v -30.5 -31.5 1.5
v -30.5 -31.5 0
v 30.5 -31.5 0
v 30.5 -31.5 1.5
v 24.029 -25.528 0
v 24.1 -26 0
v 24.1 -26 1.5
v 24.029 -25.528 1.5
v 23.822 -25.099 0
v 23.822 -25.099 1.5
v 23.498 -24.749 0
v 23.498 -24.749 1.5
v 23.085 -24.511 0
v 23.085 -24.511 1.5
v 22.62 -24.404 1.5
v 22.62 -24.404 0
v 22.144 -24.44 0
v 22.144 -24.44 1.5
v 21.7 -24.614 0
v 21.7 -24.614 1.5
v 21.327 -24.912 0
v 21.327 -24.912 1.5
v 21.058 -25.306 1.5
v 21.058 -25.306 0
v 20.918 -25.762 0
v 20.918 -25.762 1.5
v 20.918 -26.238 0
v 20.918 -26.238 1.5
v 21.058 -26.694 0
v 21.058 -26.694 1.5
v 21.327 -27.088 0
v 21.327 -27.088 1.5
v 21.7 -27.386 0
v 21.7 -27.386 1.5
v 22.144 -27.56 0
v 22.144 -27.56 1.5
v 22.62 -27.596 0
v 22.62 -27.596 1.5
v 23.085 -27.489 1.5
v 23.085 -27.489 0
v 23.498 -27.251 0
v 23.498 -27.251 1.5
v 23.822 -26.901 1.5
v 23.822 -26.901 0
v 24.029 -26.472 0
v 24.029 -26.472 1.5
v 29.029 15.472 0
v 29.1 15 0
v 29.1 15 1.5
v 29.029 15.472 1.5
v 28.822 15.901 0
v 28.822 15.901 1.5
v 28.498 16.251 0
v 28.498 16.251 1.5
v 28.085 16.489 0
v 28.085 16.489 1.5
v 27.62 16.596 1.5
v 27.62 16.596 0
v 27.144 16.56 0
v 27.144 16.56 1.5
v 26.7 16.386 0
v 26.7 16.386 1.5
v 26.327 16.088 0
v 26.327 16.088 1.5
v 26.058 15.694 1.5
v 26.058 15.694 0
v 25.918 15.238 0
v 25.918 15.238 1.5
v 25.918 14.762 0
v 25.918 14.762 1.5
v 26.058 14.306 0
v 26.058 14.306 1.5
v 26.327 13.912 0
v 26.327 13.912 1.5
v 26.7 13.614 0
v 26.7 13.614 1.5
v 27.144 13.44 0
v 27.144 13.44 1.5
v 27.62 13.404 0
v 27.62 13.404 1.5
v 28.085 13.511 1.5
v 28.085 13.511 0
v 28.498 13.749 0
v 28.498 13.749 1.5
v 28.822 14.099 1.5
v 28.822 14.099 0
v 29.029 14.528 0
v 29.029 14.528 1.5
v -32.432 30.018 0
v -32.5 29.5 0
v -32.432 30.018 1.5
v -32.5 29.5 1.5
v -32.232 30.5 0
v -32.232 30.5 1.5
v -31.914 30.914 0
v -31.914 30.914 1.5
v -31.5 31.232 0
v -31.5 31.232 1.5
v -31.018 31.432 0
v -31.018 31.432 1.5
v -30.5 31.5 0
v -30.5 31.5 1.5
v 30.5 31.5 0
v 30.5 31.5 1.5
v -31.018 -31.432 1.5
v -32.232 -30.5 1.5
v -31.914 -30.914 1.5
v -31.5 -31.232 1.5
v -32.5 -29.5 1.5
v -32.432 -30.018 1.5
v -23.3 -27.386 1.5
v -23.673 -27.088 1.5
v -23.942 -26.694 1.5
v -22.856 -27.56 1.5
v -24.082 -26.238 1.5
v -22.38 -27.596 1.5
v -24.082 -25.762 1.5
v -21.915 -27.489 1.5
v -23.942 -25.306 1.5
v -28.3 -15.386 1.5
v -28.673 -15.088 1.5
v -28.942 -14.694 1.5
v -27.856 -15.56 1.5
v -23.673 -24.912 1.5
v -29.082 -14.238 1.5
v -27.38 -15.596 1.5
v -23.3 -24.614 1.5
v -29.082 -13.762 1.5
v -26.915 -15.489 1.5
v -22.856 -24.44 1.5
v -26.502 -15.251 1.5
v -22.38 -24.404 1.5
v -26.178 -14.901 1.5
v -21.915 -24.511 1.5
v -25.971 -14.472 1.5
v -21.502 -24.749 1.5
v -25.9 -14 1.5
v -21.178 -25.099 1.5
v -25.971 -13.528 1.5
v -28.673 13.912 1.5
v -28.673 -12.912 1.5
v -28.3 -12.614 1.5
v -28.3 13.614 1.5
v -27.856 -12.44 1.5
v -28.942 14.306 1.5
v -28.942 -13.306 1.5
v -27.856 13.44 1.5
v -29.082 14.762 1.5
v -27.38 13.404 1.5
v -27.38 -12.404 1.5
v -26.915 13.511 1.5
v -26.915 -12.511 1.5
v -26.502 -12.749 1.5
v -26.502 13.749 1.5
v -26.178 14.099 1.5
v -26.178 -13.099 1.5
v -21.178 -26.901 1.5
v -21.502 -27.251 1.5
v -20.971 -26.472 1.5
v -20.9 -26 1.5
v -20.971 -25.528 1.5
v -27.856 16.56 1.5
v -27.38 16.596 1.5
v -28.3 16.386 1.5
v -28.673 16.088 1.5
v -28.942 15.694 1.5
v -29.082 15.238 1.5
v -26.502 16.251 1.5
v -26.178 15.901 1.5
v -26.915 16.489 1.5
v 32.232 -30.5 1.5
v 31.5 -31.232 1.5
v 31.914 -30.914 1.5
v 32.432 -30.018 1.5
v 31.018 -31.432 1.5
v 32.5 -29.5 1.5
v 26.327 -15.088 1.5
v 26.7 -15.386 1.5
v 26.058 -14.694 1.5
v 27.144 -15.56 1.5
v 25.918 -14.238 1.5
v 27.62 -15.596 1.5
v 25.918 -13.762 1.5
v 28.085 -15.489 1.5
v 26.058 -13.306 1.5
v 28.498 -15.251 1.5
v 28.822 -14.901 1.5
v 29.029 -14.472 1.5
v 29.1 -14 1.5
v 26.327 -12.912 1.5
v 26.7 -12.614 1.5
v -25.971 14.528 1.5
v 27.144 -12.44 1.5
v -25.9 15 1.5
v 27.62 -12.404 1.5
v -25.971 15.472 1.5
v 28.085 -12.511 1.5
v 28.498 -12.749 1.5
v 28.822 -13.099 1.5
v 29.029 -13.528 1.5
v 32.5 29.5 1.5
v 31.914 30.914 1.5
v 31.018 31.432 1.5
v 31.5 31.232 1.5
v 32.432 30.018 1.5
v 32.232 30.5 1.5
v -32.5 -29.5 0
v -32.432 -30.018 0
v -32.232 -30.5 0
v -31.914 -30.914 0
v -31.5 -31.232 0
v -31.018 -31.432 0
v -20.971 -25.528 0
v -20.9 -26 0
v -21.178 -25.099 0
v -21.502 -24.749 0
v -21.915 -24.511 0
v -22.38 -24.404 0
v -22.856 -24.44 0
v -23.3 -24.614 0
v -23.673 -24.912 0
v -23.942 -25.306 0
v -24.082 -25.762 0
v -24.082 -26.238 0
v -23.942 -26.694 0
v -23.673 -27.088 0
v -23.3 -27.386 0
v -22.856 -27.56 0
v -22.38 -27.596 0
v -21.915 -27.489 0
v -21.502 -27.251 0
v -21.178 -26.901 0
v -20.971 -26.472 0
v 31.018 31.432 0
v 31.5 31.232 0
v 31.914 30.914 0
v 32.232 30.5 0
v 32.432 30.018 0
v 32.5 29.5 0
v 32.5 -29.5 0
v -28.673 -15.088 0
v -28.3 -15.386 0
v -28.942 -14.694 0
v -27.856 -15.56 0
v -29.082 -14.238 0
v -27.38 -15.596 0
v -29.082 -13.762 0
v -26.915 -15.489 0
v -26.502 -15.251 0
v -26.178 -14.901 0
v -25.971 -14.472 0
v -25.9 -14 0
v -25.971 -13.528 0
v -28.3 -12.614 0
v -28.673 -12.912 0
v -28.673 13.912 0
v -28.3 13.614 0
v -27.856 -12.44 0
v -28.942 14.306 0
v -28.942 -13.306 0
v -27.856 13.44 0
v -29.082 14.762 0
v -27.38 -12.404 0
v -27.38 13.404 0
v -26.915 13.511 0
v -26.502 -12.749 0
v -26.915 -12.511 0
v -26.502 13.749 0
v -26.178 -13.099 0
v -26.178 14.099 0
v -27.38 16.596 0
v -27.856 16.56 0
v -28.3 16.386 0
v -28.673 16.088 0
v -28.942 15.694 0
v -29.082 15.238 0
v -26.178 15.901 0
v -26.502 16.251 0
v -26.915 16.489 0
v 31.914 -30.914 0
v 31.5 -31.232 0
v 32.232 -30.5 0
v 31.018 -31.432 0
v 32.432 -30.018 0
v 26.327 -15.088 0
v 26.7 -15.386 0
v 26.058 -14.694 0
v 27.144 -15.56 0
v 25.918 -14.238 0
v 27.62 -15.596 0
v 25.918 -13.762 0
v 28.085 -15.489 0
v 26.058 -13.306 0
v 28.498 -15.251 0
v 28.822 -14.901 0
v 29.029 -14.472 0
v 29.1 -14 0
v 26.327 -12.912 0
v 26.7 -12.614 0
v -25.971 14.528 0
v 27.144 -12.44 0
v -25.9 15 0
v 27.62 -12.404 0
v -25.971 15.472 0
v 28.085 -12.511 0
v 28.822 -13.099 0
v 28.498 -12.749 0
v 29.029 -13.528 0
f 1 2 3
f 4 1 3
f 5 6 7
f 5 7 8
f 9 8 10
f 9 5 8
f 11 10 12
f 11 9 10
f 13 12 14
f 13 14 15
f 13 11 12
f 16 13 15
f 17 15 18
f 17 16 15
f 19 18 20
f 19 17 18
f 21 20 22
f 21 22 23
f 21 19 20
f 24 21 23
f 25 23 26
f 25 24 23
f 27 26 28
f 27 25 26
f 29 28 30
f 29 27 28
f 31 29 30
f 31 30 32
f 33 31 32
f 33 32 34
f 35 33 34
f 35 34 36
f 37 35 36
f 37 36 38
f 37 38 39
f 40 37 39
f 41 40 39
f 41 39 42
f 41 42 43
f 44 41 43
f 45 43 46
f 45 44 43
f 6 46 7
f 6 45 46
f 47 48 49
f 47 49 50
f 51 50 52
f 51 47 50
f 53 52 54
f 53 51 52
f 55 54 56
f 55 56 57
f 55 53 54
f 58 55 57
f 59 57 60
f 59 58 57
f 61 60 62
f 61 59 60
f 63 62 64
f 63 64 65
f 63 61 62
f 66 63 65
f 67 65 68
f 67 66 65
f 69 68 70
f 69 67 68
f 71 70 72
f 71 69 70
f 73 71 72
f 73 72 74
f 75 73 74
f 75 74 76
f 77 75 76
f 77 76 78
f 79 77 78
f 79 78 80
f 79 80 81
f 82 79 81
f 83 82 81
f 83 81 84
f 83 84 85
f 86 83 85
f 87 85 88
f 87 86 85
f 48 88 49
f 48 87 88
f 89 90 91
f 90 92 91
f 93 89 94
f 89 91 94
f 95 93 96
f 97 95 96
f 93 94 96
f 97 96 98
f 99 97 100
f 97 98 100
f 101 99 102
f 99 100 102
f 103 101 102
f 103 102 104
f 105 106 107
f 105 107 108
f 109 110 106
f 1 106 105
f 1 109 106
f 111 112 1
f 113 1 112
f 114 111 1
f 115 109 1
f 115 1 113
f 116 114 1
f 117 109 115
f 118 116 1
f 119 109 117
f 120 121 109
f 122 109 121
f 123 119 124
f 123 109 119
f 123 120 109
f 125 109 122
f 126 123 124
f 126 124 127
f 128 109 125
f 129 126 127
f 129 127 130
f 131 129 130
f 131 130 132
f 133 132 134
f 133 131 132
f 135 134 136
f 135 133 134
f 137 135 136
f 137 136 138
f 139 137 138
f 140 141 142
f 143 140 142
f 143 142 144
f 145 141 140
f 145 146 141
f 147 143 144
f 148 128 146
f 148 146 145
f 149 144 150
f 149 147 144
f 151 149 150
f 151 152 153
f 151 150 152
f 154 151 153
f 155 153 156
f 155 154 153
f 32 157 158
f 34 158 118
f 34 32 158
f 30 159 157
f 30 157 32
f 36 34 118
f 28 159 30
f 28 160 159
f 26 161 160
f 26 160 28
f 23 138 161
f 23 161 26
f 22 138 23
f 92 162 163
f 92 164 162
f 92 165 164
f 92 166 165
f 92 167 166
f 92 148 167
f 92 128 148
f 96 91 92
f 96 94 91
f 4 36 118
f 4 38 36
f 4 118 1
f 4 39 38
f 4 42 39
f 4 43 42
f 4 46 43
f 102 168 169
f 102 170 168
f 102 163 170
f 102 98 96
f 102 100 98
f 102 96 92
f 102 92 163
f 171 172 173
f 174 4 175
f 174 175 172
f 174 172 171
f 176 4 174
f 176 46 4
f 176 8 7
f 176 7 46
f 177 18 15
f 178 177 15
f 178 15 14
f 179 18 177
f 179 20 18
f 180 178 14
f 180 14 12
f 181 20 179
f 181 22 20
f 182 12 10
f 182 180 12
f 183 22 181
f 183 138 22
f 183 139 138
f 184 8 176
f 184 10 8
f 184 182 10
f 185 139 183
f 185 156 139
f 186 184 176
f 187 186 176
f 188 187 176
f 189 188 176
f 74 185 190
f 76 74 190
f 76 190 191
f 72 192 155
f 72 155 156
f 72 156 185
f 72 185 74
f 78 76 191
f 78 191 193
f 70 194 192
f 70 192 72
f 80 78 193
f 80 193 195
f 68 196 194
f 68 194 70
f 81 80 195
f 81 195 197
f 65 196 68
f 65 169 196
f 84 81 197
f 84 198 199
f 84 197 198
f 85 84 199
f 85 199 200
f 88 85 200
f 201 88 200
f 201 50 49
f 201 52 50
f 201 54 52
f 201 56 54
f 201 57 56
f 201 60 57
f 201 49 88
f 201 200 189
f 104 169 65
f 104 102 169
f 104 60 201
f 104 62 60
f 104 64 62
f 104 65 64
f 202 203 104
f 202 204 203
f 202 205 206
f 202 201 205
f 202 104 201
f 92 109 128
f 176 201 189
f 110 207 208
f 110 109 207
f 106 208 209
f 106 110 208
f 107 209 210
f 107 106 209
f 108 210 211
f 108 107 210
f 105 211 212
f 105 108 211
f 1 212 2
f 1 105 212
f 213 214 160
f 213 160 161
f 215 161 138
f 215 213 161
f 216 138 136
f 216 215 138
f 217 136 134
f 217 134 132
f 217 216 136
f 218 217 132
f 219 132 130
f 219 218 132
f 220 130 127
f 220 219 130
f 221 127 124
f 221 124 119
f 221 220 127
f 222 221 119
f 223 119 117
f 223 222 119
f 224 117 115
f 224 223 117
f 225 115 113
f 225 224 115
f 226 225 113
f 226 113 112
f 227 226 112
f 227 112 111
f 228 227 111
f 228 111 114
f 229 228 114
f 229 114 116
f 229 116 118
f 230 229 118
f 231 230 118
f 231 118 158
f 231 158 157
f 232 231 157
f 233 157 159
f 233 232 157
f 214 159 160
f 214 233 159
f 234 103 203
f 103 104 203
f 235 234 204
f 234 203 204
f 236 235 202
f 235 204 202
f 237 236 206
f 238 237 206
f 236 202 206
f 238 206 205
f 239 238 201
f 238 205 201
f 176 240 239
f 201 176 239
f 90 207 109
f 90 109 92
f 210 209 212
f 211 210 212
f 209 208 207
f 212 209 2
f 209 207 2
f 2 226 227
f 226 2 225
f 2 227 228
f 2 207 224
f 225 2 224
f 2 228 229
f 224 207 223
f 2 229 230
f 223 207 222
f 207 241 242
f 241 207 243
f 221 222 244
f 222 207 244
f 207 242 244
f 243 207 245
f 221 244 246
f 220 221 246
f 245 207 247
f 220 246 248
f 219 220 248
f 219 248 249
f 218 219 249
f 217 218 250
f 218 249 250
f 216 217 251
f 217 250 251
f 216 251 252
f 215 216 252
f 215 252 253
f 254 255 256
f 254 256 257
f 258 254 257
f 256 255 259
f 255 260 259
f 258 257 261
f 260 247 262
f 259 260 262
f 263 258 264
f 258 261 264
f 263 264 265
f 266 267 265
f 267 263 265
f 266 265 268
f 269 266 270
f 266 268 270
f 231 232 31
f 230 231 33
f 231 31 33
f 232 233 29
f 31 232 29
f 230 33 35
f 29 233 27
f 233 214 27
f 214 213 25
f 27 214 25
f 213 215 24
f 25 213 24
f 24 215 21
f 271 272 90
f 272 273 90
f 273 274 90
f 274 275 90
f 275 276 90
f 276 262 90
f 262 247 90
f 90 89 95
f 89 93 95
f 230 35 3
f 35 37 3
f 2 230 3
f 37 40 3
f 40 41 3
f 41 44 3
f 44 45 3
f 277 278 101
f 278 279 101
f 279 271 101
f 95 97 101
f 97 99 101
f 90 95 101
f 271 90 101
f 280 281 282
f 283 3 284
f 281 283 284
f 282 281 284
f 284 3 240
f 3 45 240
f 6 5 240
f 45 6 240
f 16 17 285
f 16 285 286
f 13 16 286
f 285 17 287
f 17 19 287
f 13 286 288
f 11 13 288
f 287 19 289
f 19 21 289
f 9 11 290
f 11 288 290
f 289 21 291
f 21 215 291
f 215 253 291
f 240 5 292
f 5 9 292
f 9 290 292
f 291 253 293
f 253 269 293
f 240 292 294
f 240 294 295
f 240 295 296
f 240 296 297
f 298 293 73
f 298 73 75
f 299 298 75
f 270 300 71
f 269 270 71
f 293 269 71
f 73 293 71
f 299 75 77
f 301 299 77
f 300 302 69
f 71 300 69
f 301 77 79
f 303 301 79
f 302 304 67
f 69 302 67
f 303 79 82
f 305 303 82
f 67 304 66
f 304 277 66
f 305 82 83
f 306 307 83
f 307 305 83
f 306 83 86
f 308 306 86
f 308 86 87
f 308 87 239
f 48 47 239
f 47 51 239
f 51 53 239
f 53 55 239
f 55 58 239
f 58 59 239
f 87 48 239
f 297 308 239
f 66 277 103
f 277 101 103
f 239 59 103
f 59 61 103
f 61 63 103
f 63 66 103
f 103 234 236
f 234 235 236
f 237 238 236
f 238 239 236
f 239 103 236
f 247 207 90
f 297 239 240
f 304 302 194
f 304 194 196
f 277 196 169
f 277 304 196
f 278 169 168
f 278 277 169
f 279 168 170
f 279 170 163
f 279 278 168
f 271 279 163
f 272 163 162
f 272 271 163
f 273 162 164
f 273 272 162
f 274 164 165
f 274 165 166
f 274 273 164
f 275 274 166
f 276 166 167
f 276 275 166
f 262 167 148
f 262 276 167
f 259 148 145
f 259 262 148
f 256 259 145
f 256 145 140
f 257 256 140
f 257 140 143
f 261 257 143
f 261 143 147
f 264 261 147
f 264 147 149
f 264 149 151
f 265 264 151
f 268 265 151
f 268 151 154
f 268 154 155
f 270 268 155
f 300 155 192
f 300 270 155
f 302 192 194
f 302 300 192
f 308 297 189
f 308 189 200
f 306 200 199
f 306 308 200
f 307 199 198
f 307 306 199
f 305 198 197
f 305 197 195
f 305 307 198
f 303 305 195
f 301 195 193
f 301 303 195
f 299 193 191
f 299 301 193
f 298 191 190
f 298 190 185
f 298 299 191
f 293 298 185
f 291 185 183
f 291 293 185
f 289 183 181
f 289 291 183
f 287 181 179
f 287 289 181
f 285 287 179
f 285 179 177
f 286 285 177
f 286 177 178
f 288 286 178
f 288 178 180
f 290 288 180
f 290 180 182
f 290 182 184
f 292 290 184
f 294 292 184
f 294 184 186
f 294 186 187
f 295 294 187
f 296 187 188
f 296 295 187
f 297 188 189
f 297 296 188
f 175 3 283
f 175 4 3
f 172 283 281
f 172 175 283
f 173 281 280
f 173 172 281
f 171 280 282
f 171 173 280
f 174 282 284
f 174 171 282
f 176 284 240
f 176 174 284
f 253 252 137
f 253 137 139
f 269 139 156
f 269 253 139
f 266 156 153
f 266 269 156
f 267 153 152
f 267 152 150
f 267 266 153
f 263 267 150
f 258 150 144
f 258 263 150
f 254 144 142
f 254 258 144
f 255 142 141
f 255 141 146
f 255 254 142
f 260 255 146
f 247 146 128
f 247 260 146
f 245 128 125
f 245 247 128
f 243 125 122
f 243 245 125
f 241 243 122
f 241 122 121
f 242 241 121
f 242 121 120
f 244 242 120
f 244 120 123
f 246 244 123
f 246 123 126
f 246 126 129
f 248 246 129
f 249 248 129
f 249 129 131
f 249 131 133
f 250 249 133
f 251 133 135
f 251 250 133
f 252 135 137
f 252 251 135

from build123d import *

# Parameters (mm, degrees)
SKETCH_2_W      = 65
SKETCH_2_H      = 63
SKETCH_2_R      = 1.6
EXTRUDE_1_DEPTH = 1.5
FILLET_1_R      = 2


with BuildPart() as part:
    # 草图2 → 凸台-拉伸1 (new body)
    with BuildSketch(Plane.XY):
        Rectangle(SKETCH_2_W, SKETCH_2_H)
        with Locations((-27.5, -14)):
            Circle(SKETCH_2_R, mode=Mode.SUBTRACT)
        with Locations((-27.5, 15)):
            Circle(SKETCH_2_R, mode=Mode.SUBTRACT)
        with Locations((27.5, 15)):
            Circle(SKETCH_2_R, mode=Mode.SUBTRACT)
        with Locations((27.5, -14)):
            Circle(SKETCH_2_R, mode=Mode.SUBTRACT)
        with Locations((22.5, -26)):
            Circle(SKETCH_2_R, mode=Mode.SUBTRACT)
        with Locations((-22.5, -26)):
            Circle(SKETCH_2_R, mode=Mode.SUBTRACT)
    extrude(amount=EXTRUDE_1_DEPTH)

    # 圆角1
    fillet_1_edges = [part.edges().sort_by_distance(p)[0] for p in [
        (32.5, -31.5, 0.75),
        (-32.5, -31.5, 0.75),
        (-32.5, 31.5, 0.75),
        (32.5, 31.5, 0.75),
    ]]
    fillet(fillet_1_edges, radius=FILLET_1_R)


solid = part.part
